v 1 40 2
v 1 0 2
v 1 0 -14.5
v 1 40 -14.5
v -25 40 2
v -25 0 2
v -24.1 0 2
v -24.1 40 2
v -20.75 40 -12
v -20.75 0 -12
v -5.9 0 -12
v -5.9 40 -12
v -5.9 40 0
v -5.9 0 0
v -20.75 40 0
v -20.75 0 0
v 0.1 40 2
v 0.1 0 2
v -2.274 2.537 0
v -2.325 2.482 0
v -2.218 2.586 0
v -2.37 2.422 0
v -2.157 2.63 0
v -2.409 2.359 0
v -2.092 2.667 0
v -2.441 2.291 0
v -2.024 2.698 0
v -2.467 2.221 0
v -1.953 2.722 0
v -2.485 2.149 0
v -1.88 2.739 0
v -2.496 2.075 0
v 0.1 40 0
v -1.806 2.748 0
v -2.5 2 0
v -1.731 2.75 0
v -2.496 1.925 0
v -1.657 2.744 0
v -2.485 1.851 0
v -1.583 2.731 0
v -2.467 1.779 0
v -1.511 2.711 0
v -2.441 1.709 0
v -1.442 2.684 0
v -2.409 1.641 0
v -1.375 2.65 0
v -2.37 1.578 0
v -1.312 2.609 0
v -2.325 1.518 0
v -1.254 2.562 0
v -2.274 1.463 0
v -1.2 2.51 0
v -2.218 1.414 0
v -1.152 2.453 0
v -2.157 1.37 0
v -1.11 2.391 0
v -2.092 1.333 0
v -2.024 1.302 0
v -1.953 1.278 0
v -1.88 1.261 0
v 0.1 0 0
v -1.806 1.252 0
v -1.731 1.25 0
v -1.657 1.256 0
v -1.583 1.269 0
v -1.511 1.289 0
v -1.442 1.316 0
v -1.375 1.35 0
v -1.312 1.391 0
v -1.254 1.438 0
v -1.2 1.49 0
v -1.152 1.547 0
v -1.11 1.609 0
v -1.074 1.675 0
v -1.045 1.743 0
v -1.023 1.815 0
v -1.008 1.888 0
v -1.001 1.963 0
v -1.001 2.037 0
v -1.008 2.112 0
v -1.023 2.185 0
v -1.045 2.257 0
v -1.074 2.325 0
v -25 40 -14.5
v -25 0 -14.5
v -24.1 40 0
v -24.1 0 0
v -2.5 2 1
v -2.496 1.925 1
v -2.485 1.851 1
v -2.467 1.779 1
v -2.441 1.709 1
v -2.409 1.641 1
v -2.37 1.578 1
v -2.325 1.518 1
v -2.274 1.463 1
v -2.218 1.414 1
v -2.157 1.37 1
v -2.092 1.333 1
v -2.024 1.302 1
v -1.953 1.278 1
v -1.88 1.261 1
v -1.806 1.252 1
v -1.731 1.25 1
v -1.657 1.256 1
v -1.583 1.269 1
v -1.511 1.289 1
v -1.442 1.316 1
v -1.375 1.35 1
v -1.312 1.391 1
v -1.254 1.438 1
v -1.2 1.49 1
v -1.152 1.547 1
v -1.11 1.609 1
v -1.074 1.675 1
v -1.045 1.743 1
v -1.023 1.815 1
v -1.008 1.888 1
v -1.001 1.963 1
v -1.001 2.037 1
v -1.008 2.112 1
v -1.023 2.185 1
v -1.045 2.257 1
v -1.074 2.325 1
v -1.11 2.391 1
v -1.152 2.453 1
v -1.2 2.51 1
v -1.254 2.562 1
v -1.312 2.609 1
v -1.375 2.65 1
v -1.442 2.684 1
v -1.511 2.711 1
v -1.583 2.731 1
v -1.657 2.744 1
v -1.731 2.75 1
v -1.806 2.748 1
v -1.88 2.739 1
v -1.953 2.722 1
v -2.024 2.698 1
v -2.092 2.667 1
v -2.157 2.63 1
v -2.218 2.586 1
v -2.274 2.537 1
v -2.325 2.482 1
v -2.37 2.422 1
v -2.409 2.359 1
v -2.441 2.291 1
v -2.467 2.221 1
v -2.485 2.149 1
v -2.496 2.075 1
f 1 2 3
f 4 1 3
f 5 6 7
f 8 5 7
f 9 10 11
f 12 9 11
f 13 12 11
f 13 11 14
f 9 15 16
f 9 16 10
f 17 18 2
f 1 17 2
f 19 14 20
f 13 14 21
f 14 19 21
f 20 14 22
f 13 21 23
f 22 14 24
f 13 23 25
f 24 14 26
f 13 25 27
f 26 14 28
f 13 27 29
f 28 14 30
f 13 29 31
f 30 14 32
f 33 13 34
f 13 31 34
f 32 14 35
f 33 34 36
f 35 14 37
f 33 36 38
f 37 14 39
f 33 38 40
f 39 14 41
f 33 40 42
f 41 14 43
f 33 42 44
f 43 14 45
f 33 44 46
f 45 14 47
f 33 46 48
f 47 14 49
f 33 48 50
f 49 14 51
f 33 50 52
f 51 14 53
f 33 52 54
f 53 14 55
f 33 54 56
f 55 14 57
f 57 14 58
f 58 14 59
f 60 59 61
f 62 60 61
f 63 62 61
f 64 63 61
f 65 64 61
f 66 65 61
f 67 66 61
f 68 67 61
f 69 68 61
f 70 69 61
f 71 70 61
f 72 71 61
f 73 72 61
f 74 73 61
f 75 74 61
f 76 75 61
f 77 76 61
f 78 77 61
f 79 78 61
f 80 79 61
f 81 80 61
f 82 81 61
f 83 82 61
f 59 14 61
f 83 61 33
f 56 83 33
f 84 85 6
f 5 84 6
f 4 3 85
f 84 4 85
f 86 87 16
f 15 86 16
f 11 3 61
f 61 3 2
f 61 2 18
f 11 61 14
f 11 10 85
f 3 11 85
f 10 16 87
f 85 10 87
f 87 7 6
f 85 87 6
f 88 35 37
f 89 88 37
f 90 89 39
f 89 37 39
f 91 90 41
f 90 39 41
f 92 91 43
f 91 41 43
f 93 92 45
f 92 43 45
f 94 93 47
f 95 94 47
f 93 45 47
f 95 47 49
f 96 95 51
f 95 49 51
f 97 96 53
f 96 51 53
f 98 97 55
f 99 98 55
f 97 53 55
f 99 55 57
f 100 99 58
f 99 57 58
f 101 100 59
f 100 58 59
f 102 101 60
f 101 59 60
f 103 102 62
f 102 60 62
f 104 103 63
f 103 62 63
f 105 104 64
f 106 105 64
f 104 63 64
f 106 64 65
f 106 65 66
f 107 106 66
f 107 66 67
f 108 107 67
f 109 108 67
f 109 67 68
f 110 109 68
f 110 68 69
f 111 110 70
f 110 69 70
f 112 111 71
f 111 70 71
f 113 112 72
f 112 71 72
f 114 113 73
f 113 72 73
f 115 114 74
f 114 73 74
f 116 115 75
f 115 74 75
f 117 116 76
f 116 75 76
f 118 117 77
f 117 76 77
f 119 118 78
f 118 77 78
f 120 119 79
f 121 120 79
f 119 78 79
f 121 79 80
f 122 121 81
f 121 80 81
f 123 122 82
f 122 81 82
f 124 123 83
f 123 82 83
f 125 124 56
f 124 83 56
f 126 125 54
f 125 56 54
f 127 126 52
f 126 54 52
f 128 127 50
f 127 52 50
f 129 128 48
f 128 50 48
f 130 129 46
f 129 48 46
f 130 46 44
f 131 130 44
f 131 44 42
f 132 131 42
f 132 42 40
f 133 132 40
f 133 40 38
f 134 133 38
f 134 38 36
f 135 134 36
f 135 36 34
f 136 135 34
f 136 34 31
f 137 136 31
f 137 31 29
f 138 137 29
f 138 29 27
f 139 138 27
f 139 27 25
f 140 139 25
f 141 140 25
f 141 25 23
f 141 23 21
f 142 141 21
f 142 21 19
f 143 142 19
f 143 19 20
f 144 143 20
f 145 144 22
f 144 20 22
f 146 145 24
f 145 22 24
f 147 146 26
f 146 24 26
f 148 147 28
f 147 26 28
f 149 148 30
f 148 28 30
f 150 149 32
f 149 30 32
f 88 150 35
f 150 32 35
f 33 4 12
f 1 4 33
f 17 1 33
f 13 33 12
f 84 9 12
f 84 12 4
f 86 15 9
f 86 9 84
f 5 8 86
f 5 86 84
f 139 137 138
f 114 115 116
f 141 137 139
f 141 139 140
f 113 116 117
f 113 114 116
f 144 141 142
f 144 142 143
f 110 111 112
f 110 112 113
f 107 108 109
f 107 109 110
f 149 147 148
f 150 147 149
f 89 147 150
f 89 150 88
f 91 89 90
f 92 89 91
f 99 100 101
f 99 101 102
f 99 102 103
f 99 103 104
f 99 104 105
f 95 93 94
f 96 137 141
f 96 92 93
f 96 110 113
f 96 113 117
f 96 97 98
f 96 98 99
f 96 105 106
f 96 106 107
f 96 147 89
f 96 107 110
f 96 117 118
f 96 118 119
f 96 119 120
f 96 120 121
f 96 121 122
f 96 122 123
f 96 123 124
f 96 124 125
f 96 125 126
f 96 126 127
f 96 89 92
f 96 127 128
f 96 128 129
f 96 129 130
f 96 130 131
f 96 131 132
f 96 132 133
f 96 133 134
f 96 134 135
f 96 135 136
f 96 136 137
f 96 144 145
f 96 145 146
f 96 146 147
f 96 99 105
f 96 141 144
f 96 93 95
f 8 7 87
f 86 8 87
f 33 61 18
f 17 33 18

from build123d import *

# Parameters (mm, degrees)
PROFILE_EXTRUDE_DEPTH  = 40
SPROCKET_SKETCH_R      = 0.75
SPROCKET_EXTRUDE_DEPTH = 1


with BuildPart() as part:
    # Profile Sketch → Profile Extrude (new body)
    with BuildSketch(Plane(origin=(0.045617437, 0, -0.024209872), x_dir=(-1, 0, 0), z_dir=(0, 1, 0))):
        Polygon((5.945617437, -11.975790128), (5.945617437, 0.024209872), (-0.054382563, 0.024209872), (-0.054382563, 2.024209872), (-0.954382563, 2.024209872), (-0.954382563, -14.475790128), (25.045617437, -14.475790128), (25.045617437, 2.024209872), (24.145617437, 2.024209872), (24.145617437, 0.024209872), (20.795617437, 0.024209872), (20.795617437, -11.975790128), align=None)
    extrude(amount=PROFILE_EXTRUDE_DEPTH)

    # Sprocket Sketch → Sprocket Extrude (add)
    with BuildSketch(Plane.XY):
        with Locations(Location((-1.75, 2, 0), (0, 0, 180))):
            Circle(SPROCKET_SKETCH_R)
    extrude(amount=SPROCKET_EXTRUDE_DEPTH)


solid = part.part
